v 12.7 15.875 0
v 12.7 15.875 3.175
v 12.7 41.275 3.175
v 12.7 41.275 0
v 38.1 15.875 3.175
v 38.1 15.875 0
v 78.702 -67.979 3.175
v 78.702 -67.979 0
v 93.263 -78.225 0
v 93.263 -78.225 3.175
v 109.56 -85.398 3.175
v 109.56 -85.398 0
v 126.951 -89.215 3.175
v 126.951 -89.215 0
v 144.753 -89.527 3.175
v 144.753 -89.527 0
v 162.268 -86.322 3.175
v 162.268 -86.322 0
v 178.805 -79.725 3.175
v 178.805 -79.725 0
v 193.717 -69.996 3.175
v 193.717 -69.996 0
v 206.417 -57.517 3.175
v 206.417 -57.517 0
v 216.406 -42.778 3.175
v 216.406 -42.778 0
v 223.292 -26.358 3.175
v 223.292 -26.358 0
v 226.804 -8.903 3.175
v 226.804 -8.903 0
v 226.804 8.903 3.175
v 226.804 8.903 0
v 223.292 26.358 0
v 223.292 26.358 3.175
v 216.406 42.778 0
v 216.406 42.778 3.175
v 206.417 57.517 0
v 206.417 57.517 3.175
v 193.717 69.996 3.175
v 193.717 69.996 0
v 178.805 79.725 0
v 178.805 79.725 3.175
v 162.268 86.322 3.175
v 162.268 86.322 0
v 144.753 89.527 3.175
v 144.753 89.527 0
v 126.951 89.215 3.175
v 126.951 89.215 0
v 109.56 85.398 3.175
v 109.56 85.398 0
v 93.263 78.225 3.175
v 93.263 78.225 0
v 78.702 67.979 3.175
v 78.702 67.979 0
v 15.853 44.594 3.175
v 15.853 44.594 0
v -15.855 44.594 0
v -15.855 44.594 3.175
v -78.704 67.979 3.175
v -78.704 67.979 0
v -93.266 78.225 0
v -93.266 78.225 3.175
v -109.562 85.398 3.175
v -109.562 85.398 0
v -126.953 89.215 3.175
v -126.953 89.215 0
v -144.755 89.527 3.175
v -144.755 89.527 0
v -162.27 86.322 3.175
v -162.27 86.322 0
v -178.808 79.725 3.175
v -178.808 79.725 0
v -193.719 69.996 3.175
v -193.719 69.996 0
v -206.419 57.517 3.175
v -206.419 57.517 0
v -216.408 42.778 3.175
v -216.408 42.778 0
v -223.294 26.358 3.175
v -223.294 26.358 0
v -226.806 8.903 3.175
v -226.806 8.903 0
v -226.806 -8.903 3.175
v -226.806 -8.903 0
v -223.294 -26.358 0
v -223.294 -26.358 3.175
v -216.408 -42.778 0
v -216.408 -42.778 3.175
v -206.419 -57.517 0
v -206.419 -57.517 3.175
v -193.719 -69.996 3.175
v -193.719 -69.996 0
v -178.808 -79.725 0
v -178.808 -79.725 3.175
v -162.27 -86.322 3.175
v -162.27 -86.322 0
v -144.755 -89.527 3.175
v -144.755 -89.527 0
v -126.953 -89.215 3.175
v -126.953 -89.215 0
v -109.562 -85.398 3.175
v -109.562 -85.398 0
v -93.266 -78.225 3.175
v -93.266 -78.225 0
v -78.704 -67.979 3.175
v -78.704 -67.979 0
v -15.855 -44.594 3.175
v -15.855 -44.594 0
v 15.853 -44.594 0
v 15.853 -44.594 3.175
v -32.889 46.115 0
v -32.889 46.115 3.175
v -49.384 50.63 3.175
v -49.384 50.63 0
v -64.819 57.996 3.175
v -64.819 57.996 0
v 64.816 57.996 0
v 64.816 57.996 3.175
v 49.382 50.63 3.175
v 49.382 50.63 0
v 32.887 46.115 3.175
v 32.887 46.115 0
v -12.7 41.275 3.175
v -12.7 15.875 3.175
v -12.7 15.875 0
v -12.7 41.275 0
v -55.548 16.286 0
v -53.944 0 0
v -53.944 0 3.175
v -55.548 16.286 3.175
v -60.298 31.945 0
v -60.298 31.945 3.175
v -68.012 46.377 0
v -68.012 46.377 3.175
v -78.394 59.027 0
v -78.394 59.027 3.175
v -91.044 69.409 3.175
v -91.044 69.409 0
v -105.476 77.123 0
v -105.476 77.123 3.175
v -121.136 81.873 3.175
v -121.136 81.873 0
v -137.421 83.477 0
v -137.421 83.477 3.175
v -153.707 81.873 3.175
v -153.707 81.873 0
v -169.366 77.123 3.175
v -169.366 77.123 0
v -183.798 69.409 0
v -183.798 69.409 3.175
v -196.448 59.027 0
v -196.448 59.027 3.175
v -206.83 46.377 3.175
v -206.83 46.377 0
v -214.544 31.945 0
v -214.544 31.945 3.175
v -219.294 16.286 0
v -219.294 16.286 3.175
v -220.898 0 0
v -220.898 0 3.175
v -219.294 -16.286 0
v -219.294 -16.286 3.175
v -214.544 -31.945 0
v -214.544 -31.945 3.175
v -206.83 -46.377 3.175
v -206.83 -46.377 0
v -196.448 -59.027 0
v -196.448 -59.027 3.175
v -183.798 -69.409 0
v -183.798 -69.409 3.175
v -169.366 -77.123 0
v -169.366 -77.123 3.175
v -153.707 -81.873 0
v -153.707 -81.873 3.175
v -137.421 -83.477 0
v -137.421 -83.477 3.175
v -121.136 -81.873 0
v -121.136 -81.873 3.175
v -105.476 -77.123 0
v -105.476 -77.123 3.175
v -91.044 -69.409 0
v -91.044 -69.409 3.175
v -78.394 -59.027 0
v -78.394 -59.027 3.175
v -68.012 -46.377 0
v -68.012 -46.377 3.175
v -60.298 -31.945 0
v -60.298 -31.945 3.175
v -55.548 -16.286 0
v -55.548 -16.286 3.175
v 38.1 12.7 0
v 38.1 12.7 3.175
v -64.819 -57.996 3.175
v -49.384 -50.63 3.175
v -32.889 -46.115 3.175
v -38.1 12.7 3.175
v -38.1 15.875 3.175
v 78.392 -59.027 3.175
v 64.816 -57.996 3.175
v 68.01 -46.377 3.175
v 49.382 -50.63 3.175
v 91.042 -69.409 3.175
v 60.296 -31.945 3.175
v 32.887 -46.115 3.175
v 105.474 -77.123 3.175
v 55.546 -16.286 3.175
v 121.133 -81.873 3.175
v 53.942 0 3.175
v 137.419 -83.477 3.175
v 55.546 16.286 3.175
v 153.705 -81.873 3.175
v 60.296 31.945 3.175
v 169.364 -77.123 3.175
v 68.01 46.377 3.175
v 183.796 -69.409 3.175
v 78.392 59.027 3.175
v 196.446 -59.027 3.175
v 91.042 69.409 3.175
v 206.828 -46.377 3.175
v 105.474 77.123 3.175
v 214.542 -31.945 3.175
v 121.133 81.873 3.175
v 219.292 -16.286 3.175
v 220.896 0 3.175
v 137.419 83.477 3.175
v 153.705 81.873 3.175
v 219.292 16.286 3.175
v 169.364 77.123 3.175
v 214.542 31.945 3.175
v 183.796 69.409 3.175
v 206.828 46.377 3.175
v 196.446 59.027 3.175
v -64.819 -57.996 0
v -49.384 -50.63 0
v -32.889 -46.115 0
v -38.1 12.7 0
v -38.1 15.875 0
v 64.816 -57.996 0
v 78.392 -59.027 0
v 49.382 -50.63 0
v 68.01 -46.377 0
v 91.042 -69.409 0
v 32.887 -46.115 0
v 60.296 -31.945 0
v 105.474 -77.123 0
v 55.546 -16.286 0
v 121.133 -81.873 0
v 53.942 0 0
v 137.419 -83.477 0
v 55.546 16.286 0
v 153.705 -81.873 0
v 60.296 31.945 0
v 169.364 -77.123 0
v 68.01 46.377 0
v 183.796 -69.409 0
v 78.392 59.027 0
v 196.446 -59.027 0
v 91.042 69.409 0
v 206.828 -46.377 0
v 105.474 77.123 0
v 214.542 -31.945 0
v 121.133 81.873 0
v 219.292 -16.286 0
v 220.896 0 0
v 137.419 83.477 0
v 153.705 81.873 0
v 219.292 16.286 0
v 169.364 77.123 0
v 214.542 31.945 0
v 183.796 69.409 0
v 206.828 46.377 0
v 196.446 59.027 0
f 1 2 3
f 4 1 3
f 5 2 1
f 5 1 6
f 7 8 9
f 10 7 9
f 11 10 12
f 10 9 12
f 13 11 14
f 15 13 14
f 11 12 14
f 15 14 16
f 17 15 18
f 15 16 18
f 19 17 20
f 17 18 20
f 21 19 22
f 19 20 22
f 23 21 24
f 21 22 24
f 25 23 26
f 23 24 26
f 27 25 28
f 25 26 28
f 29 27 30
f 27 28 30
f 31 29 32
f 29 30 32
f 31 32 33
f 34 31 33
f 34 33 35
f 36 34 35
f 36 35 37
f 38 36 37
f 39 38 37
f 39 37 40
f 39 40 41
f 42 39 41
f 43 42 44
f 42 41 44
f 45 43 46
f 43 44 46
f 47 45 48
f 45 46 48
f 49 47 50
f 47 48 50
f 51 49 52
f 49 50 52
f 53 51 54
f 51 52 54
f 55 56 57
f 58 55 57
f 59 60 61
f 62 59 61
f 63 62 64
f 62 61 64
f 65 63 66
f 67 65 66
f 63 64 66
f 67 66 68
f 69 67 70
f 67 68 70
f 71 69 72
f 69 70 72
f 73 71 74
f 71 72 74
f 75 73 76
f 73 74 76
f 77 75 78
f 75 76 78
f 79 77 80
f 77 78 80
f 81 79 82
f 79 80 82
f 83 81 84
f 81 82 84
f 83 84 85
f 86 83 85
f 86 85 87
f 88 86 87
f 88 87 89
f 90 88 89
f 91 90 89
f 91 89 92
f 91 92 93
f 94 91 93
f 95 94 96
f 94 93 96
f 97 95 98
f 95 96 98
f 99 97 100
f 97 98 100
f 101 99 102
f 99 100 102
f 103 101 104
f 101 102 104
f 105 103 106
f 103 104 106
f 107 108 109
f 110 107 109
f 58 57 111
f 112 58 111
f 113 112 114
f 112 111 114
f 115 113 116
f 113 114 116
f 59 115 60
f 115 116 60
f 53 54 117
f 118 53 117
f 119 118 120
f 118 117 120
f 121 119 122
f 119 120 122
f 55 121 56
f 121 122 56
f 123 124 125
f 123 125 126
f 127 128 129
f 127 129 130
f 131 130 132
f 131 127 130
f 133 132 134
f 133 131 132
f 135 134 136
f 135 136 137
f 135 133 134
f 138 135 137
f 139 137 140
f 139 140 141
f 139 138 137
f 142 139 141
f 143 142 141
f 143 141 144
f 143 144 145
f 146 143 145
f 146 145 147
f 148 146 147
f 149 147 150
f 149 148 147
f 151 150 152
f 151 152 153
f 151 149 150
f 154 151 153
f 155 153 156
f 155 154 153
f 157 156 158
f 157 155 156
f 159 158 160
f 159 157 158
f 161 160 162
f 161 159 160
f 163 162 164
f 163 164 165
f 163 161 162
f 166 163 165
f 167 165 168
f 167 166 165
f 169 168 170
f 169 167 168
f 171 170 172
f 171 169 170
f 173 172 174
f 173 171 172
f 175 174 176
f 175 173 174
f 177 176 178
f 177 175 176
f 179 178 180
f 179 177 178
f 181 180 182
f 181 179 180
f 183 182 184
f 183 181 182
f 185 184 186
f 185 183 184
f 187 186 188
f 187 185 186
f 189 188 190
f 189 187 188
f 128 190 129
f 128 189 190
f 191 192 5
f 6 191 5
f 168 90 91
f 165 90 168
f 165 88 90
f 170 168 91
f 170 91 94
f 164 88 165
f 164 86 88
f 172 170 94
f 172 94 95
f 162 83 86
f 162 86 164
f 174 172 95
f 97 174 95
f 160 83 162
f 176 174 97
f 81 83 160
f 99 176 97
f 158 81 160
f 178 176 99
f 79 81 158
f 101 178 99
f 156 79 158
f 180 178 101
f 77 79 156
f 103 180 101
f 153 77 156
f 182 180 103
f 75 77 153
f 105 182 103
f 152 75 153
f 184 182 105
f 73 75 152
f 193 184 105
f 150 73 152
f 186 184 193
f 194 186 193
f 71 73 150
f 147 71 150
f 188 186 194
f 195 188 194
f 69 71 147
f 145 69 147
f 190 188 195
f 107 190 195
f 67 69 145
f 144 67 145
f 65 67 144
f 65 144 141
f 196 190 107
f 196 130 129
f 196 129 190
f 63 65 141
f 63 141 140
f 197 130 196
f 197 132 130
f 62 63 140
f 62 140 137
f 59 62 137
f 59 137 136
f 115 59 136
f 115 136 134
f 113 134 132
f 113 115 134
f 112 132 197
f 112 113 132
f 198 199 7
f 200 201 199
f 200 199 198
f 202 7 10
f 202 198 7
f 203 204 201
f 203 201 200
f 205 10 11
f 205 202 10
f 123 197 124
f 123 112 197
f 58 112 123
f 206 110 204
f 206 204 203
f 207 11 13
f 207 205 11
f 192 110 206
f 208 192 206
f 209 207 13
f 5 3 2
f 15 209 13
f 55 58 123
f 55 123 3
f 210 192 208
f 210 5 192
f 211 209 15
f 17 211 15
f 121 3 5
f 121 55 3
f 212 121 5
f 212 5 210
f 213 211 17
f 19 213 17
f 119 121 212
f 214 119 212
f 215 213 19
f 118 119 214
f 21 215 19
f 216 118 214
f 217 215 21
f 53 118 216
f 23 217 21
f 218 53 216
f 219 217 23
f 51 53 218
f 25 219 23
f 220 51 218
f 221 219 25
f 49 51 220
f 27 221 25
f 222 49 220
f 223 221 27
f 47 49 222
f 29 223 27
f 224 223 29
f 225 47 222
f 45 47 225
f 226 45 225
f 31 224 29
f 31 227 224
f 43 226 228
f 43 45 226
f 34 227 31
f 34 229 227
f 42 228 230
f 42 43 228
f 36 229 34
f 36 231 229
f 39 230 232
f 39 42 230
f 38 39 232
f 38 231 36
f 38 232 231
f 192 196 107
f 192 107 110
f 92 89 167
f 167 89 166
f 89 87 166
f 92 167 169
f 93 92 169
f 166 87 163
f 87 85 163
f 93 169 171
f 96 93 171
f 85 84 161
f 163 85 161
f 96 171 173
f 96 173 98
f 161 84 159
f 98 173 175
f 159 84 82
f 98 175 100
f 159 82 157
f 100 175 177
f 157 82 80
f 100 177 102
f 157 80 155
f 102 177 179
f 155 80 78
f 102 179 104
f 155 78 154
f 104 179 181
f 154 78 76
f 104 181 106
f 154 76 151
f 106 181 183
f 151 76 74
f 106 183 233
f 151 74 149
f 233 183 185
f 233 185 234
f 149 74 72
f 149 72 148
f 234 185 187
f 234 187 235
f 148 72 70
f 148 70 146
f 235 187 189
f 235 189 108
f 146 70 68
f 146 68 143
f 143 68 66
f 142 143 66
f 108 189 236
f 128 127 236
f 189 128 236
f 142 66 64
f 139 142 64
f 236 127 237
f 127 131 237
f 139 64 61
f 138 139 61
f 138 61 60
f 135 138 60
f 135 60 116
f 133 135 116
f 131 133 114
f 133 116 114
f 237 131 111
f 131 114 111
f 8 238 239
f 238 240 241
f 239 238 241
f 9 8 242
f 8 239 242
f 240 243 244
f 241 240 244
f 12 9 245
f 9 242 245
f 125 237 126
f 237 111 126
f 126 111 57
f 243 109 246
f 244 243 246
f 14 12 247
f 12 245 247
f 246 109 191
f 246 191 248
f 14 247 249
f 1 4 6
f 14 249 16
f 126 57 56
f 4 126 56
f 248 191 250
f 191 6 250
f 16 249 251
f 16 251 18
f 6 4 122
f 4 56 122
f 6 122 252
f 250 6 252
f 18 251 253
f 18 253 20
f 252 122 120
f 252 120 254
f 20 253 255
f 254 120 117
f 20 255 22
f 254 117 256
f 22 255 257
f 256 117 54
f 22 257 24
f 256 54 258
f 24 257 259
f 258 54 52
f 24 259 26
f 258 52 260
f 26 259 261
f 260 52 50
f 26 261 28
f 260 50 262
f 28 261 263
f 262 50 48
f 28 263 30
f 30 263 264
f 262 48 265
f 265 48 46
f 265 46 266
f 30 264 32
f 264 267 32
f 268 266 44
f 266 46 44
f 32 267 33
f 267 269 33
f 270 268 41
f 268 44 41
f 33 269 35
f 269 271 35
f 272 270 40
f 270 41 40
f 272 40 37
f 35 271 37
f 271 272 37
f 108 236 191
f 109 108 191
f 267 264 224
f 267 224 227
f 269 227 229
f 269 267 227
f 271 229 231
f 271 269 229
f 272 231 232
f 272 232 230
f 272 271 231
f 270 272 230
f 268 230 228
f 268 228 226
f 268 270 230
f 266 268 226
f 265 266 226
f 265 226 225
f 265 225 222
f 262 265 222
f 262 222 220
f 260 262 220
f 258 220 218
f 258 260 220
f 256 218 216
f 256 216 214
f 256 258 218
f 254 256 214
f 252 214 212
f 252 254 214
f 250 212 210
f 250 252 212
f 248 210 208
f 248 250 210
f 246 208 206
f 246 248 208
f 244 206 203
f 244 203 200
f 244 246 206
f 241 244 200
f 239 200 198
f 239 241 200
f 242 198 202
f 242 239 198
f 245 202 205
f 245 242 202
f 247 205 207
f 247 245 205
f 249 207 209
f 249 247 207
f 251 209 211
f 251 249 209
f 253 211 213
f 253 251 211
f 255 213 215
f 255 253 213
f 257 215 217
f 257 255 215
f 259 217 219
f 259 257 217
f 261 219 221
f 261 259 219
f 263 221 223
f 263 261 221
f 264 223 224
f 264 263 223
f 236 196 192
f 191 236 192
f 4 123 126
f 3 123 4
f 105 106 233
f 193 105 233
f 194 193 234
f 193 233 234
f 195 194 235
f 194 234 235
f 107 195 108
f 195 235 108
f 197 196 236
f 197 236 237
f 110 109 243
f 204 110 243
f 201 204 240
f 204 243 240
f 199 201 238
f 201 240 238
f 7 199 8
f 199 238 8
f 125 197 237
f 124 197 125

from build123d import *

# Parameters (mm, degrees)
SKETCH1_R           = 83.4771
SKETCH1_R_2         = 3.175
BOSS_EXTRUDE1_DEPTH = 3.175
SKETCH2_W           = 25.4
SKETCH2_H           = 25.4
CUT_EXTRUDE1_DEPTH  = 4.175
SKETCH3_W           = 76.2
SKETCH3_H           = 3.175
CUT_EXTRUDE2_DEPTH  = 4.175


with BuildPart() as part:
    # Sketch1 → Boss-Extrude1 (new body)
    with BuildSketch(Plane.XY):
        with BuildLine():
            Line((-15.854735322, -44.594342032), (15.852600775, -44.594342032))
            ThreePointArc((15.852600775, -44.594342032), (49.382027762, -50.630069264), (78.701832464, -67.979464917))
            ThreePointArc((78.701832464, -67.979464917), (227.246053, 0), (78.701832464, 67.979464917))
            ThreePointArc((78.701832464, 67.979464917), (49.382027762, 50.630069264), (15.852600775, 44.594342032))
            Line((15.852600775, 44.594342032), (-15.854735322, 44.594342032))
            ThreePointArc((-15.854735322, 44.594342032), (-49.384162309, 50.630069264), (-78.703967011, 67.979464917))
            ThreePointArc((-78.703967011, 67.979464917), (-227.248187547, 0), (-78.703967011, -67.979464917))
            ThreePointArc((-78.703967011, -67.979464917), (-49.384162309, -50.630069264), (-15.854735322, -44.594342032))
        make_face()
        with Locations((137.418953, 0)):
            Circle(SKETCH1_R, mode=Mode.SUBTRACT)
        with Locations((-137.421087547, 0)):
            Circle(SKETCH1_R, mode=Mode.SUBTRACT)
        with Locations((0, 28.575000036)):
            Circle(SKETCH1_R_2, mode=Mode.SUBTRACT)
    extrude(amount=BOSS_EXTRUDE1_DEPTH)

    # Sketch2 → Cut-Extrude1 (cut, through all)
    with BuildSketch(Plane.XY.offset(3.175)):
        with Locations((0, 28.575000036)):
            Rectangle(SKETCH2_W, SKETCH2_H)
    extrude(amount=-CUT_EXTRUDE1_DEPTH, mode=Mode.SUBTRACT)

    # Sketch3 → Cut-Extrude2 (cut, through all)
    with BuildSketch(Plane.XY.offset(3.175)):
        with Locations((0, 14.287500036)):
            Rectangle(SKETCH3_W, SKETCH3_H)
    extrude(amount=-CUT_EXTRUDE2_DEPTH, mode=Mode.SUBTRACT)


solid = part.part
